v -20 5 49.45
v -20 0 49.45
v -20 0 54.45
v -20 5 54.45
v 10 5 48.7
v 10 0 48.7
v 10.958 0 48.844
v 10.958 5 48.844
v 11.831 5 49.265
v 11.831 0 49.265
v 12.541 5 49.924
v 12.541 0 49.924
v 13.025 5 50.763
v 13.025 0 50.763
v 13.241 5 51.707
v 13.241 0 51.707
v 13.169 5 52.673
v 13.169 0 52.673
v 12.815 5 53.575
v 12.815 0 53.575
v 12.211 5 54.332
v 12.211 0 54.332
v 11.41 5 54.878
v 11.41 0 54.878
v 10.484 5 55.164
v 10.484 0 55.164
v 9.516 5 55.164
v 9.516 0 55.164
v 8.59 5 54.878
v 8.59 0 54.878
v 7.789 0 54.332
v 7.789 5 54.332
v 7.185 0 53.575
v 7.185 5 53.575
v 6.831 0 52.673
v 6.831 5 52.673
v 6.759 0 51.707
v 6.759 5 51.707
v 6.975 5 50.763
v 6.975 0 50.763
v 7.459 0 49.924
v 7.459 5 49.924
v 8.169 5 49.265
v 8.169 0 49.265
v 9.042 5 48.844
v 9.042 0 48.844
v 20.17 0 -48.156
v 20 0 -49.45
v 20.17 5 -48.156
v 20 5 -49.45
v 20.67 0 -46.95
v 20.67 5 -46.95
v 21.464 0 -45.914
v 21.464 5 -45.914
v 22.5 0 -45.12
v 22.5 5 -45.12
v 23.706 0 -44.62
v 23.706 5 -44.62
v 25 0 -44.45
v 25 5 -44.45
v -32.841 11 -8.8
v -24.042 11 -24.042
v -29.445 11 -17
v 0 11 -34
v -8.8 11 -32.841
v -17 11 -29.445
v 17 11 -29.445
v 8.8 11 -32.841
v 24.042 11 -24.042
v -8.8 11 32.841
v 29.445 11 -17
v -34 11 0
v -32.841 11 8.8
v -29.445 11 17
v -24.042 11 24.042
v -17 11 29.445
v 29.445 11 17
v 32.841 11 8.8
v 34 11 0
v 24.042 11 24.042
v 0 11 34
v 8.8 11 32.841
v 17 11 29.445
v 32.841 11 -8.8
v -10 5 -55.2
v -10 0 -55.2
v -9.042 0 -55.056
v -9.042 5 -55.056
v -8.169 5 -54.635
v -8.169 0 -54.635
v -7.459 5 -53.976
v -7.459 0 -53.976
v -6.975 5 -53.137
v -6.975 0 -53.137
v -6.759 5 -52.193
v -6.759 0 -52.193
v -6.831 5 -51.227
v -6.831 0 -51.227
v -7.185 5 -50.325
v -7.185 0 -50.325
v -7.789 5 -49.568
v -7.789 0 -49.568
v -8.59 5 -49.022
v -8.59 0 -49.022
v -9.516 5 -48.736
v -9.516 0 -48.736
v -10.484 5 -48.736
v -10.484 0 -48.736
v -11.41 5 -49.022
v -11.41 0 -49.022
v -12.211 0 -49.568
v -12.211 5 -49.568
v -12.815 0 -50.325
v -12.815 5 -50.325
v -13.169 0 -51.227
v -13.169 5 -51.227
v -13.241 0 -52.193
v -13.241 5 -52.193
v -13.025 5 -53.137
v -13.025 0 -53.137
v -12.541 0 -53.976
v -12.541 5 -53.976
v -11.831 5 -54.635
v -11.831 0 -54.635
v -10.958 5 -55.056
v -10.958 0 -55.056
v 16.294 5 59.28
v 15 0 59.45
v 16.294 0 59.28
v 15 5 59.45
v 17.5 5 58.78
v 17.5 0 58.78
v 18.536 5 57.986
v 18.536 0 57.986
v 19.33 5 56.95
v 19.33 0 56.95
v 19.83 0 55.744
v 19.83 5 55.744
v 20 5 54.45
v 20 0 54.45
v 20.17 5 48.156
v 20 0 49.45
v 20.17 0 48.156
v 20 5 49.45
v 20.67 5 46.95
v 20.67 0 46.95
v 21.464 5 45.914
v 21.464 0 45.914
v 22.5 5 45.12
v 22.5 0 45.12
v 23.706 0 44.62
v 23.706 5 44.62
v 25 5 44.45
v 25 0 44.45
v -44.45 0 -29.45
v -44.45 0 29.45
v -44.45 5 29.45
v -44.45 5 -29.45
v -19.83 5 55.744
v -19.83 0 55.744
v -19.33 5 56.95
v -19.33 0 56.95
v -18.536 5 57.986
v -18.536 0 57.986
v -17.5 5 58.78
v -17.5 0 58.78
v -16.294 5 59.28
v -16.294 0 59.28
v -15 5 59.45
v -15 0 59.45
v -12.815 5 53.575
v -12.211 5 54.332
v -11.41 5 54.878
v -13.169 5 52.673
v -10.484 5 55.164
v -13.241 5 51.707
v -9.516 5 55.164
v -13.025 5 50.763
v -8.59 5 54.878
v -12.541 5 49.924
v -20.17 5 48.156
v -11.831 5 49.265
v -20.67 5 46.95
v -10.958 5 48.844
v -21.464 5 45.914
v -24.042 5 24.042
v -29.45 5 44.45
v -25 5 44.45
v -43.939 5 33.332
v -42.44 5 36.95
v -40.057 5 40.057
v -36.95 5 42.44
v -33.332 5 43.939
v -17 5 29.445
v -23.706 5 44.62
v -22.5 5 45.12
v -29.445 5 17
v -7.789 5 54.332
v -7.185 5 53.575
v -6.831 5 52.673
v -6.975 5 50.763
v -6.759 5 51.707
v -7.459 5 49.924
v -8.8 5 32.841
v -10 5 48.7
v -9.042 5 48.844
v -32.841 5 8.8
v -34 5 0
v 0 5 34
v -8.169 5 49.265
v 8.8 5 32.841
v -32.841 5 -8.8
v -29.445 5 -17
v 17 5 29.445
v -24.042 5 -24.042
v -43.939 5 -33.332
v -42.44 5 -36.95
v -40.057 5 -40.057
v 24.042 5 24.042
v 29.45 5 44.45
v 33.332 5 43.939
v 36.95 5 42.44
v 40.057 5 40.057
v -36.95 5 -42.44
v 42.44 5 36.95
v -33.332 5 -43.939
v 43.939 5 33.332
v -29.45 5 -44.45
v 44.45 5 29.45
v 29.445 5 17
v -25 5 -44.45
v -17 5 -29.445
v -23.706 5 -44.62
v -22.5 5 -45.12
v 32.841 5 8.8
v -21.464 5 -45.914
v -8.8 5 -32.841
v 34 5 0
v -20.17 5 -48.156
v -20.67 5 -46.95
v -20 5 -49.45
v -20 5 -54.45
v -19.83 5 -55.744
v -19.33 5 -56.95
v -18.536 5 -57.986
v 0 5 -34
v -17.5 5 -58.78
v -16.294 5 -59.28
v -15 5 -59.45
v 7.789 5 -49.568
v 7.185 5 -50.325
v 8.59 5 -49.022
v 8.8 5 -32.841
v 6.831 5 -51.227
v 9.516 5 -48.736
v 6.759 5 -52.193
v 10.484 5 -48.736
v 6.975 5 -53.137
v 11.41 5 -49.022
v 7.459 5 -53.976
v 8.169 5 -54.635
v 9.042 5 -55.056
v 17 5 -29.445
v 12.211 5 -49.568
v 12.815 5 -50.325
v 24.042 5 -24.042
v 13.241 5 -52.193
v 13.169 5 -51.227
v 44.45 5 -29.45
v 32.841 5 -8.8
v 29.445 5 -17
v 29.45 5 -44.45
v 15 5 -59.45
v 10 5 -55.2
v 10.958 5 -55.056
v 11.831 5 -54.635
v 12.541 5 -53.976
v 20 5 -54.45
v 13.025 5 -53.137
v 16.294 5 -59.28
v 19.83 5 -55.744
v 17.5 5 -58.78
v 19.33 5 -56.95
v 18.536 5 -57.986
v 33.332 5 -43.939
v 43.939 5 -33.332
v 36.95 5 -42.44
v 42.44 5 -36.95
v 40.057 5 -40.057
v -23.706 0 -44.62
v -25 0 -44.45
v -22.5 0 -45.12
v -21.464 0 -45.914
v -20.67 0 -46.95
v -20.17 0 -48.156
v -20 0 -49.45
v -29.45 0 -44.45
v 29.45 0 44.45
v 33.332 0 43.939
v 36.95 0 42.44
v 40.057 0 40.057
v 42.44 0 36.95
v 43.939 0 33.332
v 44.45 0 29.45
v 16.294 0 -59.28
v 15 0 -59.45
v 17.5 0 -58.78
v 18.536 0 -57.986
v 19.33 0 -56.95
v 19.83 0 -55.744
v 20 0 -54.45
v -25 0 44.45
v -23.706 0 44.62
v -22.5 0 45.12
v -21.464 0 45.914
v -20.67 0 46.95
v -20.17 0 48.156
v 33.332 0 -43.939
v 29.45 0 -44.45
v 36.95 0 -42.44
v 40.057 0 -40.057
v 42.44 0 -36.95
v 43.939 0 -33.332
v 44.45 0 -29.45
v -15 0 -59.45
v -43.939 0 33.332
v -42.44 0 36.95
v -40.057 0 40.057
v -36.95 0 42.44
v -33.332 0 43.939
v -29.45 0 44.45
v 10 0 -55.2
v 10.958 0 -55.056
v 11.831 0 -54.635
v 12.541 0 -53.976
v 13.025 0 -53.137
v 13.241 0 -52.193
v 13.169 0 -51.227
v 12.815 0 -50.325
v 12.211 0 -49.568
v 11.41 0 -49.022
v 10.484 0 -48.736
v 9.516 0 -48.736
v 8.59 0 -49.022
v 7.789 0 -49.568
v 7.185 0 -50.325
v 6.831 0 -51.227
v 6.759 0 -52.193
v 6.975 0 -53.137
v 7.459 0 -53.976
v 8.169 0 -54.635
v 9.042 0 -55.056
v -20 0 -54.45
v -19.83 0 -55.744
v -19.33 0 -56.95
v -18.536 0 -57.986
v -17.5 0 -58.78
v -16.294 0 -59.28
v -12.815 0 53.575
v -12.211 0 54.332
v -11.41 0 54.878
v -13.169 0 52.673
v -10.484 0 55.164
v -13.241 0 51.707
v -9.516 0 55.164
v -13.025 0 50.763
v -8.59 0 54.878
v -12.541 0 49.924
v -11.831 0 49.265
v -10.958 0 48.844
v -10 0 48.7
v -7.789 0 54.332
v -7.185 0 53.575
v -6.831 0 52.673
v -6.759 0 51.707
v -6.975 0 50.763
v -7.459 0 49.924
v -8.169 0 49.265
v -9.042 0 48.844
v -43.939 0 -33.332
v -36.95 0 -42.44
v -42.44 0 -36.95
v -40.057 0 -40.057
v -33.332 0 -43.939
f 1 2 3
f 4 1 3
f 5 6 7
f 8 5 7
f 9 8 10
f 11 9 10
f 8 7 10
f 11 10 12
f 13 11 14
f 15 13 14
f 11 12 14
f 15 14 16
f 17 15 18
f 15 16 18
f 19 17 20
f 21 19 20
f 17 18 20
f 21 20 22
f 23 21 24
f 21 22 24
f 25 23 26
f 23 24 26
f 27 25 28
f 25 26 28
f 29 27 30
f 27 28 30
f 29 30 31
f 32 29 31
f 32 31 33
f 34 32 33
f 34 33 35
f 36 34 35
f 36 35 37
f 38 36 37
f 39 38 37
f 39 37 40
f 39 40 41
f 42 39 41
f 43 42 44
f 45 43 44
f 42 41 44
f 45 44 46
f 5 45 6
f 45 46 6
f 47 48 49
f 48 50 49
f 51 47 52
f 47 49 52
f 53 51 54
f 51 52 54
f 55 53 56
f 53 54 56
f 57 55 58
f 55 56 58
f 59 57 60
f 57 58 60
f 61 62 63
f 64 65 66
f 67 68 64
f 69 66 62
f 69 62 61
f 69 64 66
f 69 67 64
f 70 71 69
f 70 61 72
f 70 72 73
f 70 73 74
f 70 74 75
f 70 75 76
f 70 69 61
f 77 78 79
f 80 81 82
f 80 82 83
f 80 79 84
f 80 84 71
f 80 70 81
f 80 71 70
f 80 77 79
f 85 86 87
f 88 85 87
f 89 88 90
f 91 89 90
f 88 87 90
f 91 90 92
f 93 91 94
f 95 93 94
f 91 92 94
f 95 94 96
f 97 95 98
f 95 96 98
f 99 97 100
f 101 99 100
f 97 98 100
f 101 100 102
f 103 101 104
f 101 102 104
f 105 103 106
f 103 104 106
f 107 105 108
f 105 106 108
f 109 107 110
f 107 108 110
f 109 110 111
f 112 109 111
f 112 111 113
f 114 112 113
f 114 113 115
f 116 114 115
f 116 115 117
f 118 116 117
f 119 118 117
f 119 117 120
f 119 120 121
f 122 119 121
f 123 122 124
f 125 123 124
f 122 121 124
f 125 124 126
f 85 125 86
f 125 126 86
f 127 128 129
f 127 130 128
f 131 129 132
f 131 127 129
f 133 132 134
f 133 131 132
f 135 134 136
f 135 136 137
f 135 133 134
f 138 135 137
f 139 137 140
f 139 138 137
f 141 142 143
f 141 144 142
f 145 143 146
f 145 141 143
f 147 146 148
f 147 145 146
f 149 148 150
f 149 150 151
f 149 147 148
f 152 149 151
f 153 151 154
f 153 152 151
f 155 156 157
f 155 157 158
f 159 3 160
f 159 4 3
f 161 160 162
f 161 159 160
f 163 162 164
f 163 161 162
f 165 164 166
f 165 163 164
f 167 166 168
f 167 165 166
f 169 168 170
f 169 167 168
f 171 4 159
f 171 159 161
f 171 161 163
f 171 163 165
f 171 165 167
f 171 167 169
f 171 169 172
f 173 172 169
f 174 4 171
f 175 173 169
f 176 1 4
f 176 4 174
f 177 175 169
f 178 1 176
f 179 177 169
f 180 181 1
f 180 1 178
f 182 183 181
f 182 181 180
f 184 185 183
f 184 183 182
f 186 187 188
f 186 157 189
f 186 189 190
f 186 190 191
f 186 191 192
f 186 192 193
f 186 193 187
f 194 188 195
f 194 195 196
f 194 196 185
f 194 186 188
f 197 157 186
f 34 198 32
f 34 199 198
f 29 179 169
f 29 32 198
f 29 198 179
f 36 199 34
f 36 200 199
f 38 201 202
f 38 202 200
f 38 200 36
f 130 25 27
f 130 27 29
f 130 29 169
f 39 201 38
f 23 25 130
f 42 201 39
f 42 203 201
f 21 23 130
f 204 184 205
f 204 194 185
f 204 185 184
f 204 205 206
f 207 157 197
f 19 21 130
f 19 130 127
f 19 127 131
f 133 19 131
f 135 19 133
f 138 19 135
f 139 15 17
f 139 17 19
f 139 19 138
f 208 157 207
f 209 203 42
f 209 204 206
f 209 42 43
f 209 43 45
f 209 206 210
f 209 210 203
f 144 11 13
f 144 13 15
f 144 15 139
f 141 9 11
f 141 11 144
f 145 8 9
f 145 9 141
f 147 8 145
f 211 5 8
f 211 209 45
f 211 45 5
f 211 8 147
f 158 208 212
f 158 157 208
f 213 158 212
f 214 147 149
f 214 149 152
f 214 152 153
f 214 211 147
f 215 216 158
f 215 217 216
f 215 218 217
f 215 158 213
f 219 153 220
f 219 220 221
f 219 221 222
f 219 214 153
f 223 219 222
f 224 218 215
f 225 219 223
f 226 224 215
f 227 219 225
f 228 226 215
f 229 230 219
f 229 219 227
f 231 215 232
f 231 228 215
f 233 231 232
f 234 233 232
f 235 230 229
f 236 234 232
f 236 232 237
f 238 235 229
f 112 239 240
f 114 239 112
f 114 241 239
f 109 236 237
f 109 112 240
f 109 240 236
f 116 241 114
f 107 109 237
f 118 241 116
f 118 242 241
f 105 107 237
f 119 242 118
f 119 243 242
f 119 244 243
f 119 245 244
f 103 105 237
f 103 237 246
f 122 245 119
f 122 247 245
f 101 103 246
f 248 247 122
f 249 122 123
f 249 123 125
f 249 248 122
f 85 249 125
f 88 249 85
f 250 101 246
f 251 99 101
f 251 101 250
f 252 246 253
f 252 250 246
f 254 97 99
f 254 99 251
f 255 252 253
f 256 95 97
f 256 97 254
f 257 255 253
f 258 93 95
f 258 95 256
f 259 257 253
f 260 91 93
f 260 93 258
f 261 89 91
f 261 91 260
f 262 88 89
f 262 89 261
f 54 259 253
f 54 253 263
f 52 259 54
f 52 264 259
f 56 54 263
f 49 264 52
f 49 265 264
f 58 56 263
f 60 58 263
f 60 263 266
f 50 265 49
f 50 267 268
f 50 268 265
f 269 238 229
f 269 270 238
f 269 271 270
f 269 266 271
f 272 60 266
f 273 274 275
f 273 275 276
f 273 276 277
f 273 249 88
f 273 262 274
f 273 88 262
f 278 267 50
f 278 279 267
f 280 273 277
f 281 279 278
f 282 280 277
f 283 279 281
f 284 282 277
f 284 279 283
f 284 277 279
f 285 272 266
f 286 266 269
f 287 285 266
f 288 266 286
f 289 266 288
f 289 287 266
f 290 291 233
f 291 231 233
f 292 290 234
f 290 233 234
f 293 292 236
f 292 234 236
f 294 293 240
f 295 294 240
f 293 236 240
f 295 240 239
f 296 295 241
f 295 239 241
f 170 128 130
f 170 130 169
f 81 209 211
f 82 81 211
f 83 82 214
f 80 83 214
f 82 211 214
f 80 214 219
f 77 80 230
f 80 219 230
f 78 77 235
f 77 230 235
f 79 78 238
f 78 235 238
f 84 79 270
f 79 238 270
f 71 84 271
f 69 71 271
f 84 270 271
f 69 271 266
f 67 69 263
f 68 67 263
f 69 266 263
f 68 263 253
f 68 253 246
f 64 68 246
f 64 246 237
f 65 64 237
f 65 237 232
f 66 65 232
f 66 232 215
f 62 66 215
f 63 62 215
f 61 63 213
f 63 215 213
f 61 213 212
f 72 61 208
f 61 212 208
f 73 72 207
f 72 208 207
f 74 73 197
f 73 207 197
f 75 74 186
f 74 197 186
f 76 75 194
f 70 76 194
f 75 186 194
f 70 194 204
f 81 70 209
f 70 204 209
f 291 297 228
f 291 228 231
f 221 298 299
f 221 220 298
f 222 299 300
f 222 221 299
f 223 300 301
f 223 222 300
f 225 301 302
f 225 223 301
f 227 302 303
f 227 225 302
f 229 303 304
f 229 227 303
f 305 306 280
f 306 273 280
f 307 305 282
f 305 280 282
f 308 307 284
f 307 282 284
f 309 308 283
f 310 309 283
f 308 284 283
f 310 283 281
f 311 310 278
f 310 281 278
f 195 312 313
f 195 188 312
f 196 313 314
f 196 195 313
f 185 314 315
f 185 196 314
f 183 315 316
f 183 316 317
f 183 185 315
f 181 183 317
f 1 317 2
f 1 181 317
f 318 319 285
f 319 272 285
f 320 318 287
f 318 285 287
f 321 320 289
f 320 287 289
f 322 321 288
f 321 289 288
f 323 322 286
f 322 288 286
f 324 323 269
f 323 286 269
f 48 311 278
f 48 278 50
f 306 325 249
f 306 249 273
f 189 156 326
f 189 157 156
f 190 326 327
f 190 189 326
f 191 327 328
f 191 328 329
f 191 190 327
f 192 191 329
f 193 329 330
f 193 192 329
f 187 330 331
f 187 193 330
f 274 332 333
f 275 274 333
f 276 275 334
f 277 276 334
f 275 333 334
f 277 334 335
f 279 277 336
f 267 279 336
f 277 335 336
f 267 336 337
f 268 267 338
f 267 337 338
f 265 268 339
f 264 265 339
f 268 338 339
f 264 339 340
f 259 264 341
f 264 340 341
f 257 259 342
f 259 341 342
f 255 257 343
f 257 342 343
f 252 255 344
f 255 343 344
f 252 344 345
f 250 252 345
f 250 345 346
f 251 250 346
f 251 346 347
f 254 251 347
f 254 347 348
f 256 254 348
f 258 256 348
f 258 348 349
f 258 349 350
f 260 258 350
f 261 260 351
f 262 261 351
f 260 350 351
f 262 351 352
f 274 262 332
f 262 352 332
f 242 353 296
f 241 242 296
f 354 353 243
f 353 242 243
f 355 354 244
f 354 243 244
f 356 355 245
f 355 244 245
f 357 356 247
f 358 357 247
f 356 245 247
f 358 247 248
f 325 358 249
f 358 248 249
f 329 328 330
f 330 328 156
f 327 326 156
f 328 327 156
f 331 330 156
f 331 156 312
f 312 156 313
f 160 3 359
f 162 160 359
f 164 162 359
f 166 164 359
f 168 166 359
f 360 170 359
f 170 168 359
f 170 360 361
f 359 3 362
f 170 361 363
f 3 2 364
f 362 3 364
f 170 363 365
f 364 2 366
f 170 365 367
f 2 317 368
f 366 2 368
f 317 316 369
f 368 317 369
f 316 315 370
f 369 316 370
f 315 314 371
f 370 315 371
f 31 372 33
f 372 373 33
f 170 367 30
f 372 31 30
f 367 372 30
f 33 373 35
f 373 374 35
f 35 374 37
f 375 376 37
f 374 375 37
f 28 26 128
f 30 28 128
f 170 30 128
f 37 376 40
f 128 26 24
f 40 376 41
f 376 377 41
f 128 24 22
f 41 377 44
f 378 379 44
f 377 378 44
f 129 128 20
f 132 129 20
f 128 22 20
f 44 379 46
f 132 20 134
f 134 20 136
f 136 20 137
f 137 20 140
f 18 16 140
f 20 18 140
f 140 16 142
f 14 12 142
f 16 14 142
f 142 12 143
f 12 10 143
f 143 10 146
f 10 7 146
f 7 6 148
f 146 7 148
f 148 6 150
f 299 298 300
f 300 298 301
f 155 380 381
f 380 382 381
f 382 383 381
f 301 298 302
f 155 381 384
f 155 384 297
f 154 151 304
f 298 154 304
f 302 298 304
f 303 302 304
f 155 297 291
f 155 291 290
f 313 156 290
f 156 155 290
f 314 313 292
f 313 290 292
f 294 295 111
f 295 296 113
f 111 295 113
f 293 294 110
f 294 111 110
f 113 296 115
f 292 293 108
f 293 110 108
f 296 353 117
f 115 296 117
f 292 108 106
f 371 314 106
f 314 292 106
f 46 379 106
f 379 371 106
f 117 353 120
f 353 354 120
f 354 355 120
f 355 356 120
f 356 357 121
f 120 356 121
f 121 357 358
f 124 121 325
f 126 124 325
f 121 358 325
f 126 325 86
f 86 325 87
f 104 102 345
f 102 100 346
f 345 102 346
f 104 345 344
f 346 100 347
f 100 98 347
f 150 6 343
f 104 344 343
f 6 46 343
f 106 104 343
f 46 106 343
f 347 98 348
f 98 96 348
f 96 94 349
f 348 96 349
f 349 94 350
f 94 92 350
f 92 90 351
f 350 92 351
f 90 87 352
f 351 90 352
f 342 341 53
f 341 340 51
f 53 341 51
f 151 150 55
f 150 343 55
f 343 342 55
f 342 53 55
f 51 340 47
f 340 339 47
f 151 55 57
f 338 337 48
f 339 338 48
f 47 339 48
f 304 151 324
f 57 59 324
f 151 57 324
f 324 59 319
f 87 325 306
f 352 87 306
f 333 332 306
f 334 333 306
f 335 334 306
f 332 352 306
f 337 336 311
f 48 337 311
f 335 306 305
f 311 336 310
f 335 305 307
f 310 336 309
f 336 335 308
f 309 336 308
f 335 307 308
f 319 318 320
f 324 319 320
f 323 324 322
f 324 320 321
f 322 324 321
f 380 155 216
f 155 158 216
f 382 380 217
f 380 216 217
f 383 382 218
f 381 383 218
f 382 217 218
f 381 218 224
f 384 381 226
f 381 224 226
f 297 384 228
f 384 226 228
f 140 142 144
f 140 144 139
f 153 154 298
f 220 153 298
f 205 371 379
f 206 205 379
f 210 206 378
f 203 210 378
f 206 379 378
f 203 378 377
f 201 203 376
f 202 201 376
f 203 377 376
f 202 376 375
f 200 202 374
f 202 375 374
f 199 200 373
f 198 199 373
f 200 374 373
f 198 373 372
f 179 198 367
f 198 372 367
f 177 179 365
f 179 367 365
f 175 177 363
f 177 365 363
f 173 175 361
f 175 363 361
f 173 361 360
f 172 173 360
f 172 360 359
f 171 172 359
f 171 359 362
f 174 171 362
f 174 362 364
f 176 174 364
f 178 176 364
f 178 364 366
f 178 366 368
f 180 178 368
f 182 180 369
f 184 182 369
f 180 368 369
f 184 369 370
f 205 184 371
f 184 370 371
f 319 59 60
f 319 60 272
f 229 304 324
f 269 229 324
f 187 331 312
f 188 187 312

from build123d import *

# Parameters (mm, degrees)
SKETCH1_W           = 88.9
SKETCH1_H           = 88.9
BOSS_EXTRUDE1_DEPTH = 5
SKETCH2_R           = 34
BOSS_EXTRUDE2_DEPTH = 6
SKETCH3_W           = 20
SKETCH3_H           = 15
BOSS_EXTRUDE3_DEPTH = 5
SKETCH4_R           = 3.25
CUT_EXTRUDE1_DEPTH  = 5
FILLET1_R           = 15
FILLET2_R           = 5


with BuildPart() as part:
    # Sketch1 → Boss-Extrude1 (new body)
    with BuildSketch(Plane(origin=(0, 0, 0), x_dir=(1, 0, 0), z_dir=(0, 1, 0))):
        Rectangle(SKETCH1_W, SKETCH1_H)
    extrude(amount=BOSS_EXTRUDE1_DEPTH)

    # Sketch2 → Boss-Extrude2 (add)
    with BuildSketch(Plane(origin=(0, 5, 0), x_dir=(1, 0, 0), z_dir=(0, 1, 0))):
        with Locations(Location((0, 0, 0), (0, 0, 270))):
            Circle(SKETCH2_R)
    extrude(amount=BOSS_EXTRUDE2_DEPTH)

    # Sketch3 → Boss-Extrude3 (add)
    with BuildSketch(Plane.XZ):
        with Locations((-10, 51.95)):
            Rectangle(SKETCH3_W, SKETCH3_H)
        with Locations((10, 51.95)):
            Rectangle(SKETCH3_W, SKETCH3_H)
        with Locations((10, -51.95)):
            Rectangle(SKETCH3_W, SKETCH3_H)
        with Locations((-10, -51.95)):
            Rectangle(SKETCH3_W, SKETCH3_H)
    extrude(amount=-BOSS_EXTRUDE3_DEPTH)

    # Sketch4 → Cut-Extrude1 (cut)
    with BuildSketch(Plane.XZ):
        with Locations(Location((10, 51.95, 0), (0, 0, 270))):
            Circle(SKETCH4_R)
        with Locations(Location((-10, 51.95, 0), (0, 0, 270))):
            Circle(SKETCH4_R)
        with Locations(Location((10, -51.95, 0), (0, 0, 270))):
            Circle(SKETCH4_R)
        with Locations(Location((-10, -51.95, 0), (0, 0, 270))):
            Circle(SKETCH4_R)
    extrude(amount=-CUT_EXTRUDE1_DEPTH, mode=Mode.SUBTRACT)

    # Fillet1
    fillet1_edges = [part.edges().sort_by_distance(p)[0] for p in [
        (44.45, 2.5, 44.45),
        (-44.45, 2.5, 44.45),
        (-44.45, 2.5, -44.45),
        (44.45, 2.5, -44.45),
    ]]
    fillet(fillet1_edges, radius=FILLET1_R)

    # Fillet2
    fillet2_edges = [part.edges().sort_by_distance(p)[0] for p in [
        (-20, 2.5, 44.45),
        (-20, 2.5, 59.45),
        (20, 2.5, 59.45),
        (20, 2.5, 44.45),
        (20, 2.5, -44.45),
        (20, 2.5, -59.45),
        (-20, 2.5, -59.45),
        (-20, 2.5, -44.45),
    ]]
    fillet(fillet2_edges, radius=FILLET2_R)


solid = part.part
